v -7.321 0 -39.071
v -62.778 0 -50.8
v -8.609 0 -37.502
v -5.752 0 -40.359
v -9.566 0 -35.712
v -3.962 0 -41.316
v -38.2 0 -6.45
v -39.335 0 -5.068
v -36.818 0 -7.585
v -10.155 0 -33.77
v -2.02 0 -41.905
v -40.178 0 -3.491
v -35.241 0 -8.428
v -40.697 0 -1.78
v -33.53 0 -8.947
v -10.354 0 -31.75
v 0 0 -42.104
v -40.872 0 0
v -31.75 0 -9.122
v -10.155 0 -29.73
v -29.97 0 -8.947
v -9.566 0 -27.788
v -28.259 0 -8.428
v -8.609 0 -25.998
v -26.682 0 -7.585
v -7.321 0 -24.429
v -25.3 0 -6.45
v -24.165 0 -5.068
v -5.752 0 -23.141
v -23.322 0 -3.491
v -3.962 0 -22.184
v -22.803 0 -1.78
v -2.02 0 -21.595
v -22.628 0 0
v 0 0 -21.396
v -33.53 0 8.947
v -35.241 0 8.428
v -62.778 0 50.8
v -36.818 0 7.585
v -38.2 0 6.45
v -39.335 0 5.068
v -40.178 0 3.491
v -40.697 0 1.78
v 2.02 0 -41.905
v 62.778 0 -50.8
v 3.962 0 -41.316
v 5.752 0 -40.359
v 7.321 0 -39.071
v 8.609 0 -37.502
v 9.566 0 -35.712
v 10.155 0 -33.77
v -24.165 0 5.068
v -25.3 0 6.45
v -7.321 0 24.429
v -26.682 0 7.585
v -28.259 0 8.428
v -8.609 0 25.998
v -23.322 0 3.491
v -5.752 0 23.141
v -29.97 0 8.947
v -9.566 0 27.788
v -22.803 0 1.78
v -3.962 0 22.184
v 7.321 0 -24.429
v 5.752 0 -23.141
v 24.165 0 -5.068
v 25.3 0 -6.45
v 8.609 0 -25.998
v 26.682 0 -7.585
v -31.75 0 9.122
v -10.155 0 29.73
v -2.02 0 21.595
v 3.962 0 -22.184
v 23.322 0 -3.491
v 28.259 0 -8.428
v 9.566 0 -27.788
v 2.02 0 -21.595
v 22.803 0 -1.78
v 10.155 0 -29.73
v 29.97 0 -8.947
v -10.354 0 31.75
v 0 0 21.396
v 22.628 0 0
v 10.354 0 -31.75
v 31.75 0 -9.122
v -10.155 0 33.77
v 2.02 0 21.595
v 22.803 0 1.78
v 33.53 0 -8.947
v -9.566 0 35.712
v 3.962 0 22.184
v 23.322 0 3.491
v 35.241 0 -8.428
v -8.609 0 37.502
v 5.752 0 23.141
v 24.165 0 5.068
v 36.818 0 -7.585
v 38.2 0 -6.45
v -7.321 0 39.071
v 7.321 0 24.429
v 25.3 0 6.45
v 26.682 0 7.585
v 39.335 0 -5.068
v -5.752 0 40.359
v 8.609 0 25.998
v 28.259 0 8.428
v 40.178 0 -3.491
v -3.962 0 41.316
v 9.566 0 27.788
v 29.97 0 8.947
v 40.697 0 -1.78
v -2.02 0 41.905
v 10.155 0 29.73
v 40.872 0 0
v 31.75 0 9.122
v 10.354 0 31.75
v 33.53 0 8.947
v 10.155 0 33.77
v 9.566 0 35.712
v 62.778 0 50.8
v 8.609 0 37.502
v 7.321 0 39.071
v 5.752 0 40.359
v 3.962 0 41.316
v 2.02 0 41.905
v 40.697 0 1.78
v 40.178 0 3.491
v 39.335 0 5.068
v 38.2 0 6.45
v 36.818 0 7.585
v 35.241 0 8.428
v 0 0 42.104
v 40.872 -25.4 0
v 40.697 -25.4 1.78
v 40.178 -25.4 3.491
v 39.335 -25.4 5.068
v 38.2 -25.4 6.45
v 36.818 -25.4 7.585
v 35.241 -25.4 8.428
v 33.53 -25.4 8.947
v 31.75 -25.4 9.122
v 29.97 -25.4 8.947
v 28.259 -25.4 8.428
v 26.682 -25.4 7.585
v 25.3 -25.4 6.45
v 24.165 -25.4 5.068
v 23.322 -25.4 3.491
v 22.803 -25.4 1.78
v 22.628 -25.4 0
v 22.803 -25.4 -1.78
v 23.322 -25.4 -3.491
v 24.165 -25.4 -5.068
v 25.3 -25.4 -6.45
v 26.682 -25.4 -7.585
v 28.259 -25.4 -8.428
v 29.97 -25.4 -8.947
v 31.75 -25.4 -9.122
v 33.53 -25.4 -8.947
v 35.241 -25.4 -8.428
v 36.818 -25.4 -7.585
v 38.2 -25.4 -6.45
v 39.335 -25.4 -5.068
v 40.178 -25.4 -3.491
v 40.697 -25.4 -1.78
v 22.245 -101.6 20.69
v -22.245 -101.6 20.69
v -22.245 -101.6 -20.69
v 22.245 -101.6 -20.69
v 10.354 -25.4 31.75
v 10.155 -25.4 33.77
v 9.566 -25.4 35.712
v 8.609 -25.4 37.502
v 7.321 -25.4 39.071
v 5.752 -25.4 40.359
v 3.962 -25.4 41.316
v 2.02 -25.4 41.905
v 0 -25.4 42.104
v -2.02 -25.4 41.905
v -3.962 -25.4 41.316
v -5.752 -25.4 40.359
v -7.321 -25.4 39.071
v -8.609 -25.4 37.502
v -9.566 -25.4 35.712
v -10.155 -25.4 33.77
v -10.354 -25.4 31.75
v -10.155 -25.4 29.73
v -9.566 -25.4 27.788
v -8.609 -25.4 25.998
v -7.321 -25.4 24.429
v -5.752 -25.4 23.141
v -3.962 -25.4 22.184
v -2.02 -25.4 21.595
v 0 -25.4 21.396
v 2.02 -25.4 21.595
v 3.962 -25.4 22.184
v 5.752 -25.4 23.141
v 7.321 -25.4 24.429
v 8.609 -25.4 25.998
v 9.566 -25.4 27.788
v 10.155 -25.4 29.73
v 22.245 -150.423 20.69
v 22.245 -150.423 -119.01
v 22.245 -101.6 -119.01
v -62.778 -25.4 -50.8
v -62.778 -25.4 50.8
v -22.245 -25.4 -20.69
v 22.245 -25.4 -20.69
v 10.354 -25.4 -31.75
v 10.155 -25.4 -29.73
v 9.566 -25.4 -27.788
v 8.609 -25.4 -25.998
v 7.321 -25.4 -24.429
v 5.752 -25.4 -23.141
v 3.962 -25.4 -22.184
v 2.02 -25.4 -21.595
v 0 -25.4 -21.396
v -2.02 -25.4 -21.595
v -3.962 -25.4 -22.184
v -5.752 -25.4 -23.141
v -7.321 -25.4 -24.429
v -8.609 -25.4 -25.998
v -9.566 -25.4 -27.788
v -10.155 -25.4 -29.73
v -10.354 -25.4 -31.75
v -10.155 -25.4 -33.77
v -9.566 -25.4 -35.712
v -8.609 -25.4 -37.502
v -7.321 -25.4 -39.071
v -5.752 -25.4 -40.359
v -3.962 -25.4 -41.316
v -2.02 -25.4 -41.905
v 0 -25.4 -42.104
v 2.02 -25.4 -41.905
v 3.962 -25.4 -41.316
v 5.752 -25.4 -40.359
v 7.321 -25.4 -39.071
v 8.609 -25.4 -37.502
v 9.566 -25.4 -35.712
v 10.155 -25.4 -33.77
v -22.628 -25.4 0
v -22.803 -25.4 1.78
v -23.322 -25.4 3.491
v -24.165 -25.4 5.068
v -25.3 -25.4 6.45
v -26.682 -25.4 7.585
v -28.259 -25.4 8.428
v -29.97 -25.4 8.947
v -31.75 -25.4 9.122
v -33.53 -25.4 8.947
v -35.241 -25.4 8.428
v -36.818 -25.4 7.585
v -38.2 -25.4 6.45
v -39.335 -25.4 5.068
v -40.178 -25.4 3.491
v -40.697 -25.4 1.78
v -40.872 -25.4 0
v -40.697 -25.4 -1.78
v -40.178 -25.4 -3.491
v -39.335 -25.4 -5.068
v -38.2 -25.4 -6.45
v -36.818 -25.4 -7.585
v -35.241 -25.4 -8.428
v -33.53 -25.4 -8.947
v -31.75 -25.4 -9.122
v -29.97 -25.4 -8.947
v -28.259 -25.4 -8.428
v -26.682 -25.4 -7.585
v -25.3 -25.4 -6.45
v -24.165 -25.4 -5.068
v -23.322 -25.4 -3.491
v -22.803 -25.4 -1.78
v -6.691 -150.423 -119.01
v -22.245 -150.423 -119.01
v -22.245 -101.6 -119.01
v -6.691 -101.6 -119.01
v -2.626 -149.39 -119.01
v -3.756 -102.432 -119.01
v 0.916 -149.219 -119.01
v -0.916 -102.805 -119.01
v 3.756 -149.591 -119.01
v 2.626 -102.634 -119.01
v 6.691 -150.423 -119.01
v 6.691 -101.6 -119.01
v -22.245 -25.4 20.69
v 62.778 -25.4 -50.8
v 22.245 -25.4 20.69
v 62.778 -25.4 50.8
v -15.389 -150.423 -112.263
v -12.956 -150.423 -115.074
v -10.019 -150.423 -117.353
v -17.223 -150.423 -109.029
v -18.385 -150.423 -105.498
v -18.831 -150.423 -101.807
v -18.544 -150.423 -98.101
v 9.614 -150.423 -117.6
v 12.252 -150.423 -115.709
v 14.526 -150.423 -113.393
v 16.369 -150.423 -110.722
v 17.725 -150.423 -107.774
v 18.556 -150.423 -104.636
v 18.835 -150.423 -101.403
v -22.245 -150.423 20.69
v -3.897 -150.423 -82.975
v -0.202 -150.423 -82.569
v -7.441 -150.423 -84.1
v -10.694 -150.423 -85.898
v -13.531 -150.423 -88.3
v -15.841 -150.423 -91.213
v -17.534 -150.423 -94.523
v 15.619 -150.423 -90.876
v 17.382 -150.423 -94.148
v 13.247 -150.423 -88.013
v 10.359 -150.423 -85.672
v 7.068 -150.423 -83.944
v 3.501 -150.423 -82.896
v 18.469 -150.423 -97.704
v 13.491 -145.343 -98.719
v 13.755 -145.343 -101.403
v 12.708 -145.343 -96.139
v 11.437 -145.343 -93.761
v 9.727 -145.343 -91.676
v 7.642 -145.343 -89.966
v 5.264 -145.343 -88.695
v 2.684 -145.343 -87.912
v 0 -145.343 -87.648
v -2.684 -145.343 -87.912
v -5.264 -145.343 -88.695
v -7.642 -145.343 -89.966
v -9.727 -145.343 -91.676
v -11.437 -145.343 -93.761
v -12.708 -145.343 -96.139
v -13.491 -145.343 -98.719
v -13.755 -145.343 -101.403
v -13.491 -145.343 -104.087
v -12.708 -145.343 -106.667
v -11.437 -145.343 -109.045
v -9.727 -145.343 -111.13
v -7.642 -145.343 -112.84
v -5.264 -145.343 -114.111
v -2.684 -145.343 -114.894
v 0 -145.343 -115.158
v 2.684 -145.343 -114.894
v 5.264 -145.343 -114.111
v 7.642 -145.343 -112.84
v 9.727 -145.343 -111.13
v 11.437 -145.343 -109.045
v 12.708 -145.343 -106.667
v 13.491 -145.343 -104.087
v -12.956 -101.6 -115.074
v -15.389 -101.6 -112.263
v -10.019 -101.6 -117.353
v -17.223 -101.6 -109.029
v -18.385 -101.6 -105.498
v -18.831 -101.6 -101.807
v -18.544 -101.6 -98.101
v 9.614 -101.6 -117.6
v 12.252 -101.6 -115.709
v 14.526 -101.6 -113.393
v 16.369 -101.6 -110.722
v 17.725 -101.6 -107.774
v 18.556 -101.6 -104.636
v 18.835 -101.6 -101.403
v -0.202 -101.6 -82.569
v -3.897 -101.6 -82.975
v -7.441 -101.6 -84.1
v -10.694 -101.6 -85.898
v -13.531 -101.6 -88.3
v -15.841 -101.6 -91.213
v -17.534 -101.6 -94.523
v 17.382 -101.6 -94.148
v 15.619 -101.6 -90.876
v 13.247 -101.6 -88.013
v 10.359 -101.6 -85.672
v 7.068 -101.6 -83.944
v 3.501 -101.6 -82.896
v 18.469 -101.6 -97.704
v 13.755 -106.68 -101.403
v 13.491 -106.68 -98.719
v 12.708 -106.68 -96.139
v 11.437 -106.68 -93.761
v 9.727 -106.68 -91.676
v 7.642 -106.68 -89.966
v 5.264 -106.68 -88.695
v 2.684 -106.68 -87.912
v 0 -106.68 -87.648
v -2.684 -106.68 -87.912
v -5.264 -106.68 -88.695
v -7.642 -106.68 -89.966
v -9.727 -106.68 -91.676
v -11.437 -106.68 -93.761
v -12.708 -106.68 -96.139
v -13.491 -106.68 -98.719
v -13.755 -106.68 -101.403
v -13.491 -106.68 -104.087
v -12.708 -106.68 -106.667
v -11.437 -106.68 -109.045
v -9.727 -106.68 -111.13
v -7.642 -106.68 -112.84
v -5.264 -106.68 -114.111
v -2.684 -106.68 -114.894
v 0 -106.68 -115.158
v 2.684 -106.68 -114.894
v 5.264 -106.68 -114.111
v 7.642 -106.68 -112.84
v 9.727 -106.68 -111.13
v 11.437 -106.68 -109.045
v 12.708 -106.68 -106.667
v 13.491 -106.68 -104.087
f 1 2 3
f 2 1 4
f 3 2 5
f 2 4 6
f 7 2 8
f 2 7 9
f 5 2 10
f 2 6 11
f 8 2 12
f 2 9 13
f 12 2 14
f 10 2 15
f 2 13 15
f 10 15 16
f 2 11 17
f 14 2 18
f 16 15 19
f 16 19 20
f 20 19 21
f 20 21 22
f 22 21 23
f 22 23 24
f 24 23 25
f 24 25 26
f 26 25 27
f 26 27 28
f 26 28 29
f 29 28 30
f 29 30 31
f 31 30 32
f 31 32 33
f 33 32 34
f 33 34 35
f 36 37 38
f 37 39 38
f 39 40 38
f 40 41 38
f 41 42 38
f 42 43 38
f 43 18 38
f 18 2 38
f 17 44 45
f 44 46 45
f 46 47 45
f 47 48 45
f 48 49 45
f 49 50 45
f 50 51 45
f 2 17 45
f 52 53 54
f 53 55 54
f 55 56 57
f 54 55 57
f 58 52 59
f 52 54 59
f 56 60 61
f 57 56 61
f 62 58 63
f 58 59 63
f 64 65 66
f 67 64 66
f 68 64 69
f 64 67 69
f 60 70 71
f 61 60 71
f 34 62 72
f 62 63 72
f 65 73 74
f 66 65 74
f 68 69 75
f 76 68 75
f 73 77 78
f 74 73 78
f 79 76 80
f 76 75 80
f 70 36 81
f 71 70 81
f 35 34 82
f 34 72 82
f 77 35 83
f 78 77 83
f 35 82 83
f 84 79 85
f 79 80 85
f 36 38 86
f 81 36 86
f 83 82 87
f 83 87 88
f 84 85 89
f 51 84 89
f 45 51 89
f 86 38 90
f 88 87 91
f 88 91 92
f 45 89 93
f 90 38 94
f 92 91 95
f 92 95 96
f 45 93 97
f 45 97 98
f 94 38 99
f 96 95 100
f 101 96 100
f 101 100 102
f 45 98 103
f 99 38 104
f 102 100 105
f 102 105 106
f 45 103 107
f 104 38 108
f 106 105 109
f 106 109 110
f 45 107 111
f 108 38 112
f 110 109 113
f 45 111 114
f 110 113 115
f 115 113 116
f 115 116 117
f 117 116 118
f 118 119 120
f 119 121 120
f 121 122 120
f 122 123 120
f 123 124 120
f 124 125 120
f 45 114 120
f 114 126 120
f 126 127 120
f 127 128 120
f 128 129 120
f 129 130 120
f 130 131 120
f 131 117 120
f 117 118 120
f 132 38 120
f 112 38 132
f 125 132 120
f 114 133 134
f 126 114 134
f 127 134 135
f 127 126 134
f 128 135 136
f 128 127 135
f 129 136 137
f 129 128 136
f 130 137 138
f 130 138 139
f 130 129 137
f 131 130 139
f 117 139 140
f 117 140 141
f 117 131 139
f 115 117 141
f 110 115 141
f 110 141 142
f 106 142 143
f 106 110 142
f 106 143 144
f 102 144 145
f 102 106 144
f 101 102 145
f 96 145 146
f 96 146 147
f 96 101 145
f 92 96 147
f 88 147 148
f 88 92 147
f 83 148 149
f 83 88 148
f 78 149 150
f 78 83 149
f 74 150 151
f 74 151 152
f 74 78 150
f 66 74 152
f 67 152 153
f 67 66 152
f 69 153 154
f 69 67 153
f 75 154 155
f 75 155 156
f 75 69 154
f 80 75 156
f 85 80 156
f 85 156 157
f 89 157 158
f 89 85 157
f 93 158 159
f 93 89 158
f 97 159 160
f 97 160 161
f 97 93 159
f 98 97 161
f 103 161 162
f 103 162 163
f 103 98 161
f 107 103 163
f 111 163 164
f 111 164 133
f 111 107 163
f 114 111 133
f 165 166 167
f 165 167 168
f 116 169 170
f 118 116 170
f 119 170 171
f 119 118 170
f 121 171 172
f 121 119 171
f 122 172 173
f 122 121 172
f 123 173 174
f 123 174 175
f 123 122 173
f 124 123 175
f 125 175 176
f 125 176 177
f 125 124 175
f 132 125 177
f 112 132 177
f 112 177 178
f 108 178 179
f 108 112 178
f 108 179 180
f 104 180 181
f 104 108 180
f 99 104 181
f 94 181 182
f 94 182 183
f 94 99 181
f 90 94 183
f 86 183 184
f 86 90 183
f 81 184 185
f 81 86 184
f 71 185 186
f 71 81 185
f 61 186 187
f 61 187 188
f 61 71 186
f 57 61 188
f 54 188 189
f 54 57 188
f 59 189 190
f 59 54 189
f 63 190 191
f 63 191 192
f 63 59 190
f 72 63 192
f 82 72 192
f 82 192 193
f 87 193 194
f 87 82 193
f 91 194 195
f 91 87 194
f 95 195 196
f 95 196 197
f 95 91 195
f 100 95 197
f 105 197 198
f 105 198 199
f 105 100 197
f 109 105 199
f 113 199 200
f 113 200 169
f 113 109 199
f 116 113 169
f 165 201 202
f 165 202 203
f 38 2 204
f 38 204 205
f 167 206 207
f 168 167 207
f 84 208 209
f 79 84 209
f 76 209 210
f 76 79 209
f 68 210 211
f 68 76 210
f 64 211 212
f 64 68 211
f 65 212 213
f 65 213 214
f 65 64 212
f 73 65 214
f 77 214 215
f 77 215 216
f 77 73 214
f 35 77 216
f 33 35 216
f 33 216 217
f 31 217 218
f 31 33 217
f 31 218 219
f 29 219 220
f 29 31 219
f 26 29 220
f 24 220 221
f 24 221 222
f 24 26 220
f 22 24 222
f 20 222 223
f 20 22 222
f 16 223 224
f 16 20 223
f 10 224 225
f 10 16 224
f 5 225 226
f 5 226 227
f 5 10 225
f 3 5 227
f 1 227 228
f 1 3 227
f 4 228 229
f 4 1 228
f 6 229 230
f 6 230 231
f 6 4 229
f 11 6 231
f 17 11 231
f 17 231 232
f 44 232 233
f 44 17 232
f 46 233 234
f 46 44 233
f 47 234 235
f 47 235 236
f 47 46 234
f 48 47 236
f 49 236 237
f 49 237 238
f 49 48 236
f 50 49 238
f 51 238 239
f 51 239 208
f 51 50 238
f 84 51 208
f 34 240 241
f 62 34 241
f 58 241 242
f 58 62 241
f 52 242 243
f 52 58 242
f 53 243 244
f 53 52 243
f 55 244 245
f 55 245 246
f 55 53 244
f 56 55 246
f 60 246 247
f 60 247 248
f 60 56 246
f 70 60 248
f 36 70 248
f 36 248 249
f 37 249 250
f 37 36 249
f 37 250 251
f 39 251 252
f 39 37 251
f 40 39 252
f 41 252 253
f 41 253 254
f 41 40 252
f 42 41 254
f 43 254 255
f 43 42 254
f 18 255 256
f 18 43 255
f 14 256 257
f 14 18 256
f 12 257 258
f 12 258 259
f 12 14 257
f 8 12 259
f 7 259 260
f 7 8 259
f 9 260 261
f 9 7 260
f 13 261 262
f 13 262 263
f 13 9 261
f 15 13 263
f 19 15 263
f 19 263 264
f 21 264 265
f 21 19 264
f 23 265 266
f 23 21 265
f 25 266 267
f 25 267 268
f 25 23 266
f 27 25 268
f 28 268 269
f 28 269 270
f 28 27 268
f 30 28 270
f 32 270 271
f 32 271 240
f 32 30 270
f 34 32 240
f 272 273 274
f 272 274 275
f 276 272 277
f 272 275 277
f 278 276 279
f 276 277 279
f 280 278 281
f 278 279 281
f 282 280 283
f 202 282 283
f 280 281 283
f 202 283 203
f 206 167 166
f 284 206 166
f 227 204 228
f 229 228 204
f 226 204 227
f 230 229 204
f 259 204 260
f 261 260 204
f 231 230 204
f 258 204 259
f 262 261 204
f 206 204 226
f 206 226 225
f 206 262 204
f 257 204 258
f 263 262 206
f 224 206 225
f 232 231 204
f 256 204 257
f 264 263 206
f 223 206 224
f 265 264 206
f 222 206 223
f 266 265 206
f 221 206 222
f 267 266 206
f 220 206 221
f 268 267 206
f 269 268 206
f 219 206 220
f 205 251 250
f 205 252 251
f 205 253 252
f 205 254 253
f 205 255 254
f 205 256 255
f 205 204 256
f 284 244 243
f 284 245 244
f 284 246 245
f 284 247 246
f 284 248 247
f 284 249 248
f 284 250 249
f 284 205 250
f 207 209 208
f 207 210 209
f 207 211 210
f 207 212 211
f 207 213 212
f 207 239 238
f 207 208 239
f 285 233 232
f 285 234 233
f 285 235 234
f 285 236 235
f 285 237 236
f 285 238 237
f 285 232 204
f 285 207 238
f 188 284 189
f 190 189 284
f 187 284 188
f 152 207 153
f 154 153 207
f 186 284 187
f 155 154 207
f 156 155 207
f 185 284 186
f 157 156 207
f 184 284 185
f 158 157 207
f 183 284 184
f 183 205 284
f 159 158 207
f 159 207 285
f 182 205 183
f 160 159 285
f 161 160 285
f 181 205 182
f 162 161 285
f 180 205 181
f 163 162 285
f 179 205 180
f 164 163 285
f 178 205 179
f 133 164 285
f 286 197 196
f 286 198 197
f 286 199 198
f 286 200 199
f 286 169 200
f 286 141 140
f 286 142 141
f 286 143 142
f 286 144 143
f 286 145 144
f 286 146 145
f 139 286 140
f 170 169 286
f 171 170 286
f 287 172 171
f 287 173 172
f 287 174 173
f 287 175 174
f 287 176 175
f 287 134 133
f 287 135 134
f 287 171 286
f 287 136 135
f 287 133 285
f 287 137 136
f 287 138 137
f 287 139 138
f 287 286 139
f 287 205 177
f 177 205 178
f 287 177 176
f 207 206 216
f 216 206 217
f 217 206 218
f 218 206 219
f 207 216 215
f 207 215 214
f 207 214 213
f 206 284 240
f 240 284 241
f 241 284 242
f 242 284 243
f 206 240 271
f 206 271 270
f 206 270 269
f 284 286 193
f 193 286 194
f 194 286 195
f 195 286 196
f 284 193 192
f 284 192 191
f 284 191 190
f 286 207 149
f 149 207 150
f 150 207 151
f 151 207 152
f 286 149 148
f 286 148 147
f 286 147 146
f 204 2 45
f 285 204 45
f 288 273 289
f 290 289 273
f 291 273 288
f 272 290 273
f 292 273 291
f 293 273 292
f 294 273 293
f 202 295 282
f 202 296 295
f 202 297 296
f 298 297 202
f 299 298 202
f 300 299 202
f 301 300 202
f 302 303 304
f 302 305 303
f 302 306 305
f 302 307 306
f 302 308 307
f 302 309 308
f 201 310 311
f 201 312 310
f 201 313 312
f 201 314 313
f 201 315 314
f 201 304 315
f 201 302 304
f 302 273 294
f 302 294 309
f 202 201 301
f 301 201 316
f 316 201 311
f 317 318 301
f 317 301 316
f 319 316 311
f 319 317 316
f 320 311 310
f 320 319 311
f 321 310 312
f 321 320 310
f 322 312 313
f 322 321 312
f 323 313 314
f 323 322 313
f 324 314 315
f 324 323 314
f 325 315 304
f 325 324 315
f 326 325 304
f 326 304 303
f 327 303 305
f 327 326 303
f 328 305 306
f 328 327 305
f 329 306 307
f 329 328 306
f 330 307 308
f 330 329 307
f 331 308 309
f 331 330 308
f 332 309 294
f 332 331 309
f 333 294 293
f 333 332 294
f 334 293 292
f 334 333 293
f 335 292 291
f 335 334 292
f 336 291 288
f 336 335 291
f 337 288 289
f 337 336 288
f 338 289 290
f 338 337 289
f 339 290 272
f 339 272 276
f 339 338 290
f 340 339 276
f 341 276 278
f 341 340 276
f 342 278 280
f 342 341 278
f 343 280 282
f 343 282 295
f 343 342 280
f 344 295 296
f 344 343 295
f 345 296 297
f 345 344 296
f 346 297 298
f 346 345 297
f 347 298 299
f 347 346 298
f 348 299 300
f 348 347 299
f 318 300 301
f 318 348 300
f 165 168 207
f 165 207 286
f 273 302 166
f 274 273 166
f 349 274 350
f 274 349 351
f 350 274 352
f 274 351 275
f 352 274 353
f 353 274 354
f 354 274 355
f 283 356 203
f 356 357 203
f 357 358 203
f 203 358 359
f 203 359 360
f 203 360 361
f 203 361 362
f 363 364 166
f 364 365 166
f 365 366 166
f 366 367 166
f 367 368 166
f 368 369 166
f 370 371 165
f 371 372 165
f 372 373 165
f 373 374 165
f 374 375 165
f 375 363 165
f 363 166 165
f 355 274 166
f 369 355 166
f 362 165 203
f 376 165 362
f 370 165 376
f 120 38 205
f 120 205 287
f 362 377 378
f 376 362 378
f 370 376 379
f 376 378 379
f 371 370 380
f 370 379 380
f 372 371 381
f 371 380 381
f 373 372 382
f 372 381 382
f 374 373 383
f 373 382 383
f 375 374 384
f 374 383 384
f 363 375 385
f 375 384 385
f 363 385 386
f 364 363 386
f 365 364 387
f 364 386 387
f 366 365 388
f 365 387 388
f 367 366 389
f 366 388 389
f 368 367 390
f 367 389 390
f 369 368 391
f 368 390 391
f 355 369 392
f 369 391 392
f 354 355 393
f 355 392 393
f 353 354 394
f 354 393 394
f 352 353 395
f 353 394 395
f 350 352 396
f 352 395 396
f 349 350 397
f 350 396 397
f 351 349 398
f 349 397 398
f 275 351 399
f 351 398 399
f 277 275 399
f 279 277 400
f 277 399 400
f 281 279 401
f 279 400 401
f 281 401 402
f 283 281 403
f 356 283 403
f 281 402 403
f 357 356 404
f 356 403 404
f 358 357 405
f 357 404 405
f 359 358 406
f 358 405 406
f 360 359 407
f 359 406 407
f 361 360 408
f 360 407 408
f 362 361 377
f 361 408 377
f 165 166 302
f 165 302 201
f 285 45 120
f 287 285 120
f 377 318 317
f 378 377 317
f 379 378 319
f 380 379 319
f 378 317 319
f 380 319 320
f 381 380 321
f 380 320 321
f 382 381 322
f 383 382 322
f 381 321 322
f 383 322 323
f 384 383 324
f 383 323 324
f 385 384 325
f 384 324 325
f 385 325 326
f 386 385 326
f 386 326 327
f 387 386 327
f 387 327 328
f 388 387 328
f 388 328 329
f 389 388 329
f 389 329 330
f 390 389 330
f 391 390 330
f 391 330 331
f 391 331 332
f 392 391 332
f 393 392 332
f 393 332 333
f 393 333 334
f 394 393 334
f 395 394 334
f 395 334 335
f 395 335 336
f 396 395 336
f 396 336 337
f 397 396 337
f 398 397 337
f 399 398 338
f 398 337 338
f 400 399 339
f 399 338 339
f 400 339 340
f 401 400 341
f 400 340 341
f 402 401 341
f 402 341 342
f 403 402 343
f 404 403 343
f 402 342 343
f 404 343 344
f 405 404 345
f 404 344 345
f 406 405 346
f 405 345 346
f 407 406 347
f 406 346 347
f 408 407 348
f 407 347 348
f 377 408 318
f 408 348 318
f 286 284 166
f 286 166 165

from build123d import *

# Parameters (mm, degrees)
F0_W     = 125.5568219279
F0_H     = 101.6
F0_R     = 9.122330494
F0_R_2   = 10.3539850451
F0_W_2   = 44.48986426
F0_H_2   = 41.3803607225
F1_DEPTH = 25.4
F2_DEPTH = 101.6
F3_W     = 44.48986426
F3_H     = 48.8234969616
F4_DEPTH = 139.7
F5_R     = 13.7554341803
F6_DEPTH = 150.4244969616


# Not quite as in the source:
# - a fillet or chamfer that OpenCascade refuses, or shapes differently, is made with other operations: its cross-section is extruded or revolved along the edge and cut away or added


with BuildPart() as f1:
    # F0 (on Front) → F1 (new body)
    with BuildSketch(Plane.XZ):
        Rectangle(F0_W, F0_H)
        with Locations((-31.75, 0)):
            Circle(F0_R, mode=Mode.SUBTRACT)
        with Locations((0, -31.75)):
            Circle(F0_R_2, mode=Mode.SUBTRACT)
        Rectangle(F0_W_2, F0_H_2, mode=Mode.SUBTRACT)
        with Locations((31.75, 0)):
            Circle(F0_R, mode=Mode.SUBTRACT)
        with Locations((0, 31.75)):
            Circle(F0_R_2, mode=Mode.SUBTRACT)
    extrude(amount=F1_DEPTH)

    # F0 (on Front) → F2 (join)
    with BuildSketch(Plane.XZ):
        Rectangle(F0_W_2, F0_H_2)
    extrude(amount=F2_DEPTH)


with BuildPart() as f4:
    # F3 (on face) → F4 (new body)
    with BuildSketch(Plane.XY.offset(20.6901803613)):
        with Locations((0, -126.0117484808)):
            Rectangle(F3_W, F3_H)
    extrude(amount=-F4_DEPTH)

    # F5 (on face) → F6 (cut, through all)
    with BuildSketch(Plane.XZ.offset(150.4234969616)):
        with Locations((0, -101.4029607177)):
            Circle(F5_R)
    extrude(amount=-F6_DEPTH, mode=Mode.SUBTRACT)

    # F7: chamfer of 5.08 on 3 edges, made by hand

    # F7_s1 → F7_t2 (revolve, cut)
    with BuildSketch(Plane.XY.offset(-101.4029607177)):
        Polygon((18.8354341803, -150.4234969616), (13.7554341803, -145.3434969616), (13.7554341803, -150.4234969616), align=None)
    revolve(axis=Axis((0, -150.4234969616, -101.4029607177), (0, -1, 0)), mode=Mode.SUBTRACT)

    # F7_s3 → F7_t4 (revolve, cut)
    with BuildSketch(Plane.XY.offset(-101.4029607177)):
        Polygon((18.8354341803, -101.6), (13.7554341803, -106.68), (13.7554341803, -101.6), align=None)
    revolve(axis=Axis((0, -101.6, -101.4029607177), (0, -1, 0)), mode=Mode.SUBTRACT)


solid = Compound([f1.part, f4.part])
